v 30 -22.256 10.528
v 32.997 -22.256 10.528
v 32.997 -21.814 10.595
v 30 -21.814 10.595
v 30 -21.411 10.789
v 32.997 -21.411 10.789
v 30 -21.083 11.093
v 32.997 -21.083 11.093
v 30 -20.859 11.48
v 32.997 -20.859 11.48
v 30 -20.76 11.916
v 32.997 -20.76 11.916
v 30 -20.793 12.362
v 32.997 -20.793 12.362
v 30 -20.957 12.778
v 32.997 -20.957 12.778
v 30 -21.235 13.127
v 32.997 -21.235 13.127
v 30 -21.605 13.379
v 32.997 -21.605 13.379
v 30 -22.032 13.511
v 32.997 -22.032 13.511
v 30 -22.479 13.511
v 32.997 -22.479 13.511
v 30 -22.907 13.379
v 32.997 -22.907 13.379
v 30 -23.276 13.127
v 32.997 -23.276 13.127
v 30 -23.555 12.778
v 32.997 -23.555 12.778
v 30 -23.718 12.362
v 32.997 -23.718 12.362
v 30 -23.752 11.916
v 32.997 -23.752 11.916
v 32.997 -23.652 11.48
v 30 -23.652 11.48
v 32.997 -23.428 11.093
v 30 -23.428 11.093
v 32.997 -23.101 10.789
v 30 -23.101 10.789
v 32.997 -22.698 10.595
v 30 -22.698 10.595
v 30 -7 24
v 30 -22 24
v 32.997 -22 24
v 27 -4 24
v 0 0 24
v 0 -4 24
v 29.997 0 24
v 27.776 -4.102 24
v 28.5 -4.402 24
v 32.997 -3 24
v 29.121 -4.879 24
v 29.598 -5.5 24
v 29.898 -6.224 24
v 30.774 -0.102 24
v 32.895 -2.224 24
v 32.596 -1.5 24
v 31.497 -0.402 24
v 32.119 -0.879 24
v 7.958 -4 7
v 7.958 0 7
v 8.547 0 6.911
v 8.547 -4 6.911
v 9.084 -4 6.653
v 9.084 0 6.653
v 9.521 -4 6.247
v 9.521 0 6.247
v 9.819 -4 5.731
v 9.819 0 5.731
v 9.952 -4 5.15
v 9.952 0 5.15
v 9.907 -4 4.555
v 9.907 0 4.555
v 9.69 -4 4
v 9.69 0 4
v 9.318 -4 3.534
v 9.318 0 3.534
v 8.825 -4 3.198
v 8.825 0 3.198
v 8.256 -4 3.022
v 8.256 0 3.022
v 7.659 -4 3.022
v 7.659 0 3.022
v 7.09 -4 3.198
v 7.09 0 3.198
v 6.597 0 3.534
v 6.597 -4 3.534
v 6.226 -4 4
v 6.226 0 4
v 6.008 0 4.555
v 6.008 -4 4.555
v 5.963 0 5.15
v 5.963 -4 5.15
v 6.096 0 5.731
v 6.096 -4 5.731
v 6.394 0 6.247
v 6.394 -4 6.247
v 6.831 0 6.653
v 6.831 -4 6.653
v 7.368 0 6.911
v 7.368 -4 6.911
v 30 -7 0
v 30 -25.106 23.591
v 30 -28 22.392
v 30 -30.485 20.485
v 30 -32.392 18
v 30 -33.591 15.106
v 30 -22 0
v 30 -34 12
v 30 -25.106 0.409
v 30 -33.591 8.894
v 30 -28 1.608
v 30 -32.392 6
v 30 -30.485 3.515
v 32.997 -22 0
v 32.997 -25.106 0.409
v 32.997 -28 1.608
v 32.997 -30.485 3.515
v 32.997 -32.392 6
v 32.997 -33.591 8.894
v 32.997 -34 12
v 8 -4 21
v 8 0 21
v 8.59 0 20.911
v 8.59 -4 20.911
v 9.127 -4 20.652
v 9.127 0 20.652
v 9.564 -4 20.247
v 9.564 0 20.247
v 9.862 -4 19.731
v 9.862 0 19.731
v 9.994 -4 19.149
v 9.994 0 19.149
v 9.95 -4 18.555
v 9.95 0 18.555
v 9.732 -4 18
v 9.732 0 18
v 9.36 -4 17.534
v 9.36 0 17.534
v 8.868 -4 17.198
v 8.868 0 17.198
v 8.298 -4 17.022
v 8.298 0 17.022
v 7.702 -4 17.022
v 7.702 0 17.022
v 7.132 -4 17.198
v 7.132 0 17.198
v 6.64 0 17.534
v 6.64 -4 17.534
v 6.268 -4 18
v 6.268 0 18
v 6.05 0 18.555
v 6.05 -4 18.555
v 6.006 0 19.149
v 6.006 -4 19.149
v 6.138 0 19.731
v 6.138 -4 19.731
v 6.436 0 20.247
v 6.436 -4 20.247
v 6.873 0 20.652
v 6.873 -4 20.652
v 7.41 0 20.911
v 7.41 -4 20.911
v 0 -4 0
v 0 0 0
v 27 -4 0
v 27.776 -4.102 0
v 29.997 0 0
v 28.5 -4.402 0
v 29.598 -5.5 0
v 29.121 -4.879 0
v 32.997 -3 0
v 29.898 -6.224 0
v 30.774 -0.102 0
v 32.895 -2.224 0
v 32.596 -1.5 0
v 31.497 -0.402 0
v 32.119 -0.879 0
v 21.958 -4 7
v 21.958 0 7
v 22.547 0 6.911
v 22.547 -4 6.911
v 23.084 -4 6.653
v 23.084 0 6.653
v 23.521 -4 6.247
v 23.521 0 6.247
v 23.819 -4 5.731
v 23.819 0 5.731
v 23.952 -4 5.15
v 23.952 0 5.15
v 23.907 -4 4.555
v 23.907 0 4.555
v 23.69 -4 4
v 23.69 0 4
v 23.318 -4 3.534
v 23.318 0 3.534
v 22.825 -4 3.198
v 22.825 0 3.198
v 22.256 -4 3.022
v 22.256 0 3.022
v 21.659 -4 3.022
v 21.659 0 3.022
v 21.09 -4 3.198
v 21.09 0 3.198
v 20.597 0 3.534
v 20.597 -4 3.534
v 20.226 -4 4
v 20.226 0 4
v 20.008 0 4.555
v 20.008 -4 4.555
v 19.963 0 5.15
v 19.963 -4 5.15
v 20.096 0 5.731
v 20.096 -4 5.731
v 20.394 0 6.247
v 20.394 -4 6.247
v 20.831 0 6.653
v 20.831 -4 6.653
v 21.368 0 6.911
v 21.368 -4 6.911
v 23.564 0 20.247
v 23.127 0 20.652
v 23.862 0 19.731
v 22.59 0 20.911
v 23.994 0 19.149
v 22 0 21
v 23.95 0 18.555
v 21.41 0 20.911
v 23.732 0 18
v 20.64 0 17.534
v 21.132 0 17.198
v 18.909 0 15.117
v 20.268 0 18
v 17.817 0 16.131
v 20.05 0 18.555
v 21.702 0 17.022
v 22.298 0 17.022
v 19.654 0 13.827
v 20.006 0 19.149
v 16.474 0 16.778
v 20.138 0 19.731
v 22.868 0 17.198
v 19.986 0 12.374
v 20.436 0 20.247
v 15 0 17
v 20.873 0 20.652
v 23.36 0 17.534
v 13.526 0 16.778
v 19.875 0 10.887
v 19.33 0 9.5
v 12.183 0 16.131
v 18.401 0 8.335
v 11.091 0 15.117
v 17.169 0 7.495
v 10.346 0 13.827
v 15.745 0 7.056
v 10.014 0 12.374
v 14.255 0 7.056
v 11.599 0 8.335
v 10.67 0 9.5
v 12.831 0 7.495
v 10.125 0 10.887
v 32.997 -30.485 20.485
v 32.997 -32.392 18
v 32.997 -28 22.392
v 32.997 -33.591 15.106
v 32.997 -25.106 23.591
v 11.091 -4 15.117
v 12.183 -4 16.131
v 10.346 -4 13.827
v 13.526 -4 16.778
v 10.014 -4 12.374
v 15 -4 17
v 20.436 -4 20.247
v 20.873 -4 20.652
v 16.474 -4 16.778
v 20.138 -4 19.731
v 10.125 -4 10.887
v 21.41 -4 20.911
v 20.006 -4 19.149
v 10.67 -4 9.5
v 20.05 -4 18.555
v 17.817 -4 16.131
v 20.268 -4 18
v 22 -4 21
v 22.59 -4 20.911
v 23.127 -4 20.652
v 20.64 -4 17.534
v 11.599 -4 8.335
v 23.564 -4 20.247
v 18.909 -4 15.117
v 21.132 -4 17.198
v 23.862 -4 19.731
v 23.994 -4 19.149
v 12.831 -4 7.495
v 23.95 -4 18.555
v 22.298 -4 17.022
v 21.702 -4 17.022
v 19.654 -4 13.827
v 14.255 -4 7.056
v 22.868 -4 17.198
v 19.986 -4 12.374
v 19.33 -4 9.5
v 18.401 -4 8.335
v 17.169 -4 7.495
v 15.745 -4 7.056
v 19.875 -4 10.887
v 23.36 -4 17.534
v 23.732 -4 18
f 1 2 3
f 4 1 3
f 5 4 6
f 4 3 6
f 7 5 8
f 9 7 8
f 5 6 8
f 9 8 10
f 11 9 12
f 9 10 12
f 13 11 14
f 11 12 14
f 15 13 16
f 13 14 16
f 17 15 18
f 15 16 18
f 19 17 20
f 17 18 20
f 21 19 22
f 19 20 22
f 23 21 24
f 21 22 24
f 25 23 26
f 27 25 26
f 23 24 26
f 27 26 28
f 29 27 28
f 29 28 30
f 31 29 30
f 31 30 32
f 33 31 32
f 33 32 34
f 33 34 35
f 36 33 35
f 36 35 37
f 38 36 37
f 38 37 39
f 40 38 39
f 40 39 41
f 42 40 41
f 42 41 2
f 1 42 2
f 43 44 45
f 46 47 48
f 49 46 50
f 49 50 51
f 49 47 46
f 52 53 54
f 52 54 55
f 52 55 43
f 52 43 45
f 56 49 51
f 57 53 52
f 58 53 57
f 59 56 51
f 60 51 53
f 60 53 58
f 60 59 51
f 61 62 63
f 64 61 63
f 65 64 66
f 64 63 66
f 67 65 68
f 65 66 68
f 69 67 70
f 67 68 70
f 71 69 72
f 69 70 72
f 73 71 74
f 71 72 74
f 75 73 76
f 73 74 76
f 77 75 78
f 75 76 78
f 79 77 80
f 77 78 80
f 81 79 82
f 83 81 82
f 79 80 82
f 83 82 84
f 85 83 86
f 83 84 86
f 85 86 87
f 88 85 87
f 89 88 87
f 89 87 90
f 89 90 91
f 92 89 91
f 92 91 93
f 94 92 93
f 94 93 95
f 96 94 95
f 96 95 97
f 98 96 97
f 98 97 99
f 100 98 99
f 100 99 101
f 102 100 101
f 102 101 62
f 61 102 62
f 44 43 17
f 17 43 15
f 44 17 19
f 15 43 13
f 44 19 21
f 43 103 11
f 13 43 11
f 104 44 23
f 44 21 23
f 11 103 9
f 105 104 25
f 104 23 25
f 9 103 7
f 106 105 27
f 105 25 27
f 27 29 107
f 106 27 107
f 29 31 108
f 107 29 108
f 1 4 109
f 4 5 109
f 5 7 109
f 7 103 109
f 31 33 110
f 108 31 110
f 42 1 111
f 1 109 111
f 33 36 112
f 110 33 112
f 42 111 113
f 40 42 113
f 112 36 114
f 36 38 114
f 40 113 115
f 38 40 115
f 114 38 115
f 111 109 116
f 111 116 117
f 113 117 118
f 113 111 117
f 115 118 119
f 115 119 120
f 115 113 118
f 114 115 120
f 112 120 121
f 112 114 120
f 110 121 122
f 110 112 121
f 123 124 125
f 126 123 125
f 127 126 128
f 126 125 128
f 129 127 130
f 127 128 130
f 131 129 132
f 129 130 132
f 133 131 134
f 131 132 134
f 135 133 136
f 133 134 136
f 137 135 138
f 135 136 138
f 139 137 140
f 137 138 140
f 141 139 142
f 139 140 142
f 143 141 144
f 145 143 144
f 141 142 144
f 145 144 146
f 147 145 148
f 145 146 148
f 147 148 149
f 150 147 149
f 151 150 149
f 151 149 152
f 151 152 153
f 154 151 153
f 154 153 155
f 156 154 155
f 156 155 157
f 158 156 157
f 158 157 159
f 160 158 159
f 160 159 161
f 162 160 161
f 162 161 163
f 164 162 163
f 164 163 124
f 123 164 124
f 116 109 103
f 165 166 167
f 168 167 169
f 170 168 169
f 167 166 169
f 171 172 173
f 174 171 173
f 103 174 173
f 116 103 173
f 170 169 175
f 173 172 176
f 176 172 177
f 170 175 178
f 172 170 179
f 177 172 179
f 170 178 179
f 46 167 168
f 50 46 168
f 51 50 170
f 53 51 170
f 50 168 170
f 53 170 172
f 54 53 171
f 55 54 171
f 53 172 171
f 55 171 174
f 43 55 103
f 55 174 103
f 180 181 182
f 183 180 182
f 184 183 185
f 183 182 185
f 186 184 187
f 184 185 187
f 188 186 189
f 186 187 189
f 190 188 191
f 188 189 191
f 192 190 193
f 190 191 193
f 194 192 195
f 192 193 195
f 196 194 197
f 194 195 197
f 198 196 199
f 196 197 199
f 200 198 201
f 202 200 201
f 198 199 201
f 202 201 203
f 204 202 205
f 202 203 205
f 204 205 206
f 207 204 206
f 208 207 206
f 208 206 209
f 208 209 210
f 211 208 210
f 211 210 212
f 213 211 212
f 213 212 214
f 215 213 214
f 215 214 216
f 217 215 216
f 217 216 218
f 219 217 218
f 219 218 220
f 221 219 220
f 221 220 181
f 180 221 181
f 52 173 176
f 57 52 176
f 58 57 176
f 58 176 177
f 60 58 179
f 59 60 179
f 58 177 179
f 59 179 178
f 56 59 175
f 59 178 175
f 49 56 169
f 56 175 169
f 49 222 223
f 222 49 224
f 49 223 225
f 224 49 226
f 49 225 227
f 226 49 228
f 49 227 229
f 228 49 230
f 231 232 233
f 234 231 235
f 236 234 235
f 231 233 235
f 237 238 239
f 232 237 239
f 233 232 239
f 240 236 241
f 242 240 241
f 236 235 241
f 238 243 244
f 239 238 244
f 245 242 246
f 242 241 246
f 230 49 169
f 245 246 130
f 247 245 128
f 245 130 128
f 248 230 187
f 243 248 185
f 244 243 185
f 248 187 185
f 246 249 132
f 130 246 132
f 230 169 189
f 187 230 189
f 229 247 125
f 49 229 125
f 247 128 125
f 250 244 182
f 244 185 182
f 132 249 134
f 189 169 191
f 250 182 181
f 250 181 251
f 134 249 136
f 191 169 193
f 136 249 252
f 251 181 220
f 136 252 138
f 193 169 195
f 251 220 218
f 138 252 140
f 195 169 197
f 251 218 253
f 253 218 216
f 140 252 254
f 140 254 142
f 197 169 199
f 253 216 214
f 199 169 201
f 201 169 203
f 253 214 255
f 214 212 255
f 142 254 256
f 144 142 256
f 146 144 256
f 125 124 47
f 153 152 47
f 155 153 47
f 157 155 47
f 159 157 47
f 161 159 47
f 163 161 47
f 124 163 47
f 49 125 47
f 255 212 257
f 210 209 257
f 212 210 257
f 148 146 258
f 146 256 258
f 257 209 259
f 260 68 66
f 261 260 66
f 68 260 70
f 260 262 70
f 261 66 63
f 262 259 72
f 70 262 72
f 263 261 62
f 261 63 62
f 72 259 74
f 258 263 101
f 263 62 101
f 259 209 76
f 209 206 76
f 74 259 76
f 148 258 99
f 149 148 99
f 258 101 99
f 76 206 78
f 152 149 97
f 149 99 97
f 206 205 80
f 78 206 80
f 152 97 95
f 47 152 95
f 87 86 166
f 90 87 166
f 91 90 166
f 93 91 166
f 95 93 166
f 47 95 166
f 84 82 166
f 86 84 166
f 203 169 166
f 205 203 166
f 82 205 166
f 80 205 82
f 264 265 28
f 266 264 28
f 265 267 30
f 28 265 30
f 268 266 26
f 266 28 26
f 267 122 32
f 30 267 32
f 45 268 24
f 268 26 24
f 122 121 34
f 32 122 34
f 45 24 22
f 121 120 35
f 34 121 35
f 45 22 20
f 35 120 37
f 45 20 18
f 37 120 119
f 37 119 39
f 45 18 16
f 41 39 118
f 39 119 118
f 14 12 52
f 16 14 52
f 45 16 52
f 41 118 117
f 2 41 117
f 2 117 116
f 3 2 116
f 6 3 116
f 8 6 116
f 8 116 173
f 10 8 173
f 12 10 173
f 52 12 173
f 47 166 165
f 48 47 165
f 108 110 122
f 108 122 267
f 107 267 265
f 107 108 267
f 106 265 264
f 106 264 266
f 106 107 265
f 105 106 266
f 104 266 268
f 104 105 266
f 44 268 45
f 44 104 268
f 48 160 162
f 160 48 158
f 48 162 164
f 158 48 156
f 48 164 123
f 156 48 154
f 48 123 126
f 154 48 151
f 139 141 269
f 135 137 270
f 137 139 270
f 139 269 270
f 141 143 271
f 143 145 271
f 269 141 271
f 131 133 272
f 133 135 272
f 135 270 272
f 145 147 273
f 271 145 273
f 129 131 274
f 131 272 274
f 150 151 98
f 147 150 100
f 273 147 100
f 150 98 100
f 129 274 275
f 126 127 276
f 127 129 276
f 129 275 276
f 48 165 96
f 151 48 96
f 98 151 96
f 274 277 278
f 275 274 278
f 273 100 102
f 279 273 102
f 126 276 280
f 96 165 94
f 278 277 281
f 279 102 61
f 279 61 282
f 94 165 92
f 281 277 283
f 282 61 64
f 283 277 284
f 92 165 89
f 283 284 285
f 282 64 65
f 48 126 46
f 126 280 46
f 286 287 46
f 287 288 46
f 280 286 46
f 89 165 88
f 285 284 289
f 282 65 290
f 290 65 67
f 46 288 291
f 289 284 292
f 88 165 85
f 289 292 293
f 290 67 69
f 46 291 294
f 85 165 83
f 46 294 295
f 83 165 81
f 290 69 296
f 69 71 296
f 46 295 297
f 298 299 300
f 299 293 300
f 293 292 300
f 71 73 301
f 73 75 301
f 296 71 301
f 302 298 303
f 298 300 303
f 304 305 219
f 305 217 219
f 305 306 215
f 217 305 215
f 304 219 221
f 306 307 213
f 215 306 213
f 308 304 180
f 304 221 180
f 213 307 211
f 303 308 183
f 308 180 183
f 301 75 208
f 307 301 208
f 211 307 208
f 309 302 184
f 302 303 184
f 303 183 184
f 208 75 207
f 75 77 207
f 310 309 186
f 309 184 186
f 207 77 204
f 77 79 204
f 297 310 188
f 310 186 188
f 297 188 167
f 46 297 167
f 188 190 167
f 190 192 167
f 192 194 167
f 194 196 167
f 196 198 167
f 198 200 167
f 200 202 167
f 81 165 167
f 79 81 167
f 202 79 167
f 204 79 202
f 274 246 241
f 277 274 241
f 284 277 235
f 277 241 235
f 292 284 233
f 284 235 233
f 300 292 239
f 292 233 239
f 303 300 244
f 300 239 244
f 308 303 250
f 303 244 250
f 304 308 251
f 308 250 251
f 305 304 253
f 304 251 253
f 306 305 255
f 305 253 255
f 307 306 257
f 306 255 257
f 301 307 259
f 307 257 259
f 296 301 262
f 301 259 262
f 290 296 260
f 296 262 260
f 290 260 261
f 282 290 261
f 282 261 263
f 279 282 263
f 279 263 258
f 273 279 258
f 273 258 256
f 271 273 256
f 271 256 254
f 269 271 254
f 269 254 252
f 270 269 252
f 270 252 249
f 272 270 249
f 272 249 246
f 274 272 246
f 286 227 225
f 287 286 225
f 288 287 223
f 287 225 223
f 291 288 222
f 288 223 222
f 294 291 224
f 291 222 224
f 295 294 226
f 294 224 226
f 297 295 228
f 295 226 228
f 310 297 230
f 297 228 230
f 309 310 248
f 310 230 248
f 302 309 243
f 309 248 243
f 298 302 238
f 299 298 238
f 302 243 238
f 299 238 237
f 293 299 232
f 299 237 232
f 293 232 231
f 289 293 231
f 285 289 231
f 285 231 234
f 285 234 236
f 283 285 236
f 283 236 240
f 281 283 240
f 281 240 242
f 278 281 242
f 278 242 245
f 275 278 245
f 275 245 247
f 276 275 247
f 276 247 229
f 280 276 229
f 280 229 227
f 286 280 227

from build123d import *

# Parameters (mm, degrees)
EXTRUDE_1_DEPTH          = 24
CUT_EXTRUDE_2_DEPTH      = 54.111509792
CUT_EXTRUDE_2_DEPTH_BACK = 40
CUT_EXTRUDE_START        = -40
CUT_EXTRUDE_3_DEPTH      = 40
SKETCH_8_R               = 2
SKETCH_8_R_2             = 5
CUT_EXTRUDE_4_DEPTH      = 40
SKETCH_9_R               = 1.5
CUT_EXTRUDE_5_DEPTH      = 10


with BuildPart() as part:
    # 草图1 → 凸台-拉伸1 (new body)
    with BuildSketch(Plane.XY):
        with BuildLine():
            Line((30, -7), (30, -34))
            Line((30, -34), (32.997461605, -34))
            Line((32.997461605, -34), (32.997461605, -3))
            ThreePointArc((32.997461605, -3), (32.118781948, -0.878679656), (29.997461605, 0))
            Line((29.997461605, 0), (0, 0))
            Line((0, 0), (0, -4))
            Line((0, -4), (27, -4))
            ThreePointArc((27, -4), (29.121320344, -4.878679656), (30, -7))
        make_face()
    extrude(amount=EXTRUDE_1_DEPTH)

    # 草图4 → 切除-拉伸2 (cut, two sides: drawn at the far end of the back side and taken through both)
    with BuildSketch(Plane(origin=(32.997461605, 0, 0), x_dir=(0, 0, -1), z_dir=(1, 0, 0)).offset(-CUT_EXTRUDE_2_DEPTH_BACK)):
        with BuildLine():
            Line((-24, -34), (-12, -34))
            ThreePointArc((-12, -34), (-20.485281374, -30.485281374), (-24, -22))
            Line((-24, -22), (-24, -34))
        make_face()
    extrude(amount=CUT_EXTRUDE_2_DEPTH + CUT_EXTRUDE_2_DEPTH_BACK, mode=Mode.SUBTRACT)

    # 草图7 → 切除-拉伸3 (cut)
    with BuildSketch(Plane(origin=(32.997461605, 0, 0), x_dir=(0, 0, -1), z_dir=(1, 0, 0)).offset(CUT_EXTRUDE_START)):
        with BuildLine():
            Line((0, -34), (0, -22))
            ThreePointArc((0, -22), (-3.514718626, -30.485281374), (-12, -34))
            Line((-12, -34), (0, -34))
        make_face()
    extrude(amount=CUT_EXTRUDE_3_DEPTH, mode=Mode.SUBTRACT)

    # 草图8 → 切除-拉伸4 (cut)
    with BuildSketch(Plane(origin=(0, 0, 0), x_dir=(1, 0, 0), z_dir=(0, 1, 0))):
        with Locations(Location((7.95757976, -5.000064267, 0), (0, 0, 270))):
            Circle(SKETCH_8_R)
        with Locations(Location((22, -19, 0), (0, 0, 270))):
            Circle(SKETCH_8_R)
        with Locations(Location((21.95757976, -5.000064267, 0), (0, 0, 270))):
            Circle(SKETCH_8_R)
        with Locations(Location((15, -12, 0), (0, 0, 270))):
            Circle(SKETCH_8_R_2)
        with Locations(Location((8, -19, 0), (0, 0, 270))):
            Circle(SKETCH_8_R)
    extrude(amount=-CUT_EXTRUDE_4_DEPTH, mode=Mode.SUBTRACT)

    # 草图9 → 切除-拉伸5 (cut)
    with BuildSketch(Plane(origin=(32.997461605, 0, 0), x_dir=(0, 0, -1), z_dir=(1, 0, 0))):
        with Locations((-12.027919591, -22.255700116)):
            Circle(SKETCH_9_R)
    extrude(amount=-CUT_EXTRUDE_5_DEPTH, mode=Mode.SUBTRACT)


solid = part.part
